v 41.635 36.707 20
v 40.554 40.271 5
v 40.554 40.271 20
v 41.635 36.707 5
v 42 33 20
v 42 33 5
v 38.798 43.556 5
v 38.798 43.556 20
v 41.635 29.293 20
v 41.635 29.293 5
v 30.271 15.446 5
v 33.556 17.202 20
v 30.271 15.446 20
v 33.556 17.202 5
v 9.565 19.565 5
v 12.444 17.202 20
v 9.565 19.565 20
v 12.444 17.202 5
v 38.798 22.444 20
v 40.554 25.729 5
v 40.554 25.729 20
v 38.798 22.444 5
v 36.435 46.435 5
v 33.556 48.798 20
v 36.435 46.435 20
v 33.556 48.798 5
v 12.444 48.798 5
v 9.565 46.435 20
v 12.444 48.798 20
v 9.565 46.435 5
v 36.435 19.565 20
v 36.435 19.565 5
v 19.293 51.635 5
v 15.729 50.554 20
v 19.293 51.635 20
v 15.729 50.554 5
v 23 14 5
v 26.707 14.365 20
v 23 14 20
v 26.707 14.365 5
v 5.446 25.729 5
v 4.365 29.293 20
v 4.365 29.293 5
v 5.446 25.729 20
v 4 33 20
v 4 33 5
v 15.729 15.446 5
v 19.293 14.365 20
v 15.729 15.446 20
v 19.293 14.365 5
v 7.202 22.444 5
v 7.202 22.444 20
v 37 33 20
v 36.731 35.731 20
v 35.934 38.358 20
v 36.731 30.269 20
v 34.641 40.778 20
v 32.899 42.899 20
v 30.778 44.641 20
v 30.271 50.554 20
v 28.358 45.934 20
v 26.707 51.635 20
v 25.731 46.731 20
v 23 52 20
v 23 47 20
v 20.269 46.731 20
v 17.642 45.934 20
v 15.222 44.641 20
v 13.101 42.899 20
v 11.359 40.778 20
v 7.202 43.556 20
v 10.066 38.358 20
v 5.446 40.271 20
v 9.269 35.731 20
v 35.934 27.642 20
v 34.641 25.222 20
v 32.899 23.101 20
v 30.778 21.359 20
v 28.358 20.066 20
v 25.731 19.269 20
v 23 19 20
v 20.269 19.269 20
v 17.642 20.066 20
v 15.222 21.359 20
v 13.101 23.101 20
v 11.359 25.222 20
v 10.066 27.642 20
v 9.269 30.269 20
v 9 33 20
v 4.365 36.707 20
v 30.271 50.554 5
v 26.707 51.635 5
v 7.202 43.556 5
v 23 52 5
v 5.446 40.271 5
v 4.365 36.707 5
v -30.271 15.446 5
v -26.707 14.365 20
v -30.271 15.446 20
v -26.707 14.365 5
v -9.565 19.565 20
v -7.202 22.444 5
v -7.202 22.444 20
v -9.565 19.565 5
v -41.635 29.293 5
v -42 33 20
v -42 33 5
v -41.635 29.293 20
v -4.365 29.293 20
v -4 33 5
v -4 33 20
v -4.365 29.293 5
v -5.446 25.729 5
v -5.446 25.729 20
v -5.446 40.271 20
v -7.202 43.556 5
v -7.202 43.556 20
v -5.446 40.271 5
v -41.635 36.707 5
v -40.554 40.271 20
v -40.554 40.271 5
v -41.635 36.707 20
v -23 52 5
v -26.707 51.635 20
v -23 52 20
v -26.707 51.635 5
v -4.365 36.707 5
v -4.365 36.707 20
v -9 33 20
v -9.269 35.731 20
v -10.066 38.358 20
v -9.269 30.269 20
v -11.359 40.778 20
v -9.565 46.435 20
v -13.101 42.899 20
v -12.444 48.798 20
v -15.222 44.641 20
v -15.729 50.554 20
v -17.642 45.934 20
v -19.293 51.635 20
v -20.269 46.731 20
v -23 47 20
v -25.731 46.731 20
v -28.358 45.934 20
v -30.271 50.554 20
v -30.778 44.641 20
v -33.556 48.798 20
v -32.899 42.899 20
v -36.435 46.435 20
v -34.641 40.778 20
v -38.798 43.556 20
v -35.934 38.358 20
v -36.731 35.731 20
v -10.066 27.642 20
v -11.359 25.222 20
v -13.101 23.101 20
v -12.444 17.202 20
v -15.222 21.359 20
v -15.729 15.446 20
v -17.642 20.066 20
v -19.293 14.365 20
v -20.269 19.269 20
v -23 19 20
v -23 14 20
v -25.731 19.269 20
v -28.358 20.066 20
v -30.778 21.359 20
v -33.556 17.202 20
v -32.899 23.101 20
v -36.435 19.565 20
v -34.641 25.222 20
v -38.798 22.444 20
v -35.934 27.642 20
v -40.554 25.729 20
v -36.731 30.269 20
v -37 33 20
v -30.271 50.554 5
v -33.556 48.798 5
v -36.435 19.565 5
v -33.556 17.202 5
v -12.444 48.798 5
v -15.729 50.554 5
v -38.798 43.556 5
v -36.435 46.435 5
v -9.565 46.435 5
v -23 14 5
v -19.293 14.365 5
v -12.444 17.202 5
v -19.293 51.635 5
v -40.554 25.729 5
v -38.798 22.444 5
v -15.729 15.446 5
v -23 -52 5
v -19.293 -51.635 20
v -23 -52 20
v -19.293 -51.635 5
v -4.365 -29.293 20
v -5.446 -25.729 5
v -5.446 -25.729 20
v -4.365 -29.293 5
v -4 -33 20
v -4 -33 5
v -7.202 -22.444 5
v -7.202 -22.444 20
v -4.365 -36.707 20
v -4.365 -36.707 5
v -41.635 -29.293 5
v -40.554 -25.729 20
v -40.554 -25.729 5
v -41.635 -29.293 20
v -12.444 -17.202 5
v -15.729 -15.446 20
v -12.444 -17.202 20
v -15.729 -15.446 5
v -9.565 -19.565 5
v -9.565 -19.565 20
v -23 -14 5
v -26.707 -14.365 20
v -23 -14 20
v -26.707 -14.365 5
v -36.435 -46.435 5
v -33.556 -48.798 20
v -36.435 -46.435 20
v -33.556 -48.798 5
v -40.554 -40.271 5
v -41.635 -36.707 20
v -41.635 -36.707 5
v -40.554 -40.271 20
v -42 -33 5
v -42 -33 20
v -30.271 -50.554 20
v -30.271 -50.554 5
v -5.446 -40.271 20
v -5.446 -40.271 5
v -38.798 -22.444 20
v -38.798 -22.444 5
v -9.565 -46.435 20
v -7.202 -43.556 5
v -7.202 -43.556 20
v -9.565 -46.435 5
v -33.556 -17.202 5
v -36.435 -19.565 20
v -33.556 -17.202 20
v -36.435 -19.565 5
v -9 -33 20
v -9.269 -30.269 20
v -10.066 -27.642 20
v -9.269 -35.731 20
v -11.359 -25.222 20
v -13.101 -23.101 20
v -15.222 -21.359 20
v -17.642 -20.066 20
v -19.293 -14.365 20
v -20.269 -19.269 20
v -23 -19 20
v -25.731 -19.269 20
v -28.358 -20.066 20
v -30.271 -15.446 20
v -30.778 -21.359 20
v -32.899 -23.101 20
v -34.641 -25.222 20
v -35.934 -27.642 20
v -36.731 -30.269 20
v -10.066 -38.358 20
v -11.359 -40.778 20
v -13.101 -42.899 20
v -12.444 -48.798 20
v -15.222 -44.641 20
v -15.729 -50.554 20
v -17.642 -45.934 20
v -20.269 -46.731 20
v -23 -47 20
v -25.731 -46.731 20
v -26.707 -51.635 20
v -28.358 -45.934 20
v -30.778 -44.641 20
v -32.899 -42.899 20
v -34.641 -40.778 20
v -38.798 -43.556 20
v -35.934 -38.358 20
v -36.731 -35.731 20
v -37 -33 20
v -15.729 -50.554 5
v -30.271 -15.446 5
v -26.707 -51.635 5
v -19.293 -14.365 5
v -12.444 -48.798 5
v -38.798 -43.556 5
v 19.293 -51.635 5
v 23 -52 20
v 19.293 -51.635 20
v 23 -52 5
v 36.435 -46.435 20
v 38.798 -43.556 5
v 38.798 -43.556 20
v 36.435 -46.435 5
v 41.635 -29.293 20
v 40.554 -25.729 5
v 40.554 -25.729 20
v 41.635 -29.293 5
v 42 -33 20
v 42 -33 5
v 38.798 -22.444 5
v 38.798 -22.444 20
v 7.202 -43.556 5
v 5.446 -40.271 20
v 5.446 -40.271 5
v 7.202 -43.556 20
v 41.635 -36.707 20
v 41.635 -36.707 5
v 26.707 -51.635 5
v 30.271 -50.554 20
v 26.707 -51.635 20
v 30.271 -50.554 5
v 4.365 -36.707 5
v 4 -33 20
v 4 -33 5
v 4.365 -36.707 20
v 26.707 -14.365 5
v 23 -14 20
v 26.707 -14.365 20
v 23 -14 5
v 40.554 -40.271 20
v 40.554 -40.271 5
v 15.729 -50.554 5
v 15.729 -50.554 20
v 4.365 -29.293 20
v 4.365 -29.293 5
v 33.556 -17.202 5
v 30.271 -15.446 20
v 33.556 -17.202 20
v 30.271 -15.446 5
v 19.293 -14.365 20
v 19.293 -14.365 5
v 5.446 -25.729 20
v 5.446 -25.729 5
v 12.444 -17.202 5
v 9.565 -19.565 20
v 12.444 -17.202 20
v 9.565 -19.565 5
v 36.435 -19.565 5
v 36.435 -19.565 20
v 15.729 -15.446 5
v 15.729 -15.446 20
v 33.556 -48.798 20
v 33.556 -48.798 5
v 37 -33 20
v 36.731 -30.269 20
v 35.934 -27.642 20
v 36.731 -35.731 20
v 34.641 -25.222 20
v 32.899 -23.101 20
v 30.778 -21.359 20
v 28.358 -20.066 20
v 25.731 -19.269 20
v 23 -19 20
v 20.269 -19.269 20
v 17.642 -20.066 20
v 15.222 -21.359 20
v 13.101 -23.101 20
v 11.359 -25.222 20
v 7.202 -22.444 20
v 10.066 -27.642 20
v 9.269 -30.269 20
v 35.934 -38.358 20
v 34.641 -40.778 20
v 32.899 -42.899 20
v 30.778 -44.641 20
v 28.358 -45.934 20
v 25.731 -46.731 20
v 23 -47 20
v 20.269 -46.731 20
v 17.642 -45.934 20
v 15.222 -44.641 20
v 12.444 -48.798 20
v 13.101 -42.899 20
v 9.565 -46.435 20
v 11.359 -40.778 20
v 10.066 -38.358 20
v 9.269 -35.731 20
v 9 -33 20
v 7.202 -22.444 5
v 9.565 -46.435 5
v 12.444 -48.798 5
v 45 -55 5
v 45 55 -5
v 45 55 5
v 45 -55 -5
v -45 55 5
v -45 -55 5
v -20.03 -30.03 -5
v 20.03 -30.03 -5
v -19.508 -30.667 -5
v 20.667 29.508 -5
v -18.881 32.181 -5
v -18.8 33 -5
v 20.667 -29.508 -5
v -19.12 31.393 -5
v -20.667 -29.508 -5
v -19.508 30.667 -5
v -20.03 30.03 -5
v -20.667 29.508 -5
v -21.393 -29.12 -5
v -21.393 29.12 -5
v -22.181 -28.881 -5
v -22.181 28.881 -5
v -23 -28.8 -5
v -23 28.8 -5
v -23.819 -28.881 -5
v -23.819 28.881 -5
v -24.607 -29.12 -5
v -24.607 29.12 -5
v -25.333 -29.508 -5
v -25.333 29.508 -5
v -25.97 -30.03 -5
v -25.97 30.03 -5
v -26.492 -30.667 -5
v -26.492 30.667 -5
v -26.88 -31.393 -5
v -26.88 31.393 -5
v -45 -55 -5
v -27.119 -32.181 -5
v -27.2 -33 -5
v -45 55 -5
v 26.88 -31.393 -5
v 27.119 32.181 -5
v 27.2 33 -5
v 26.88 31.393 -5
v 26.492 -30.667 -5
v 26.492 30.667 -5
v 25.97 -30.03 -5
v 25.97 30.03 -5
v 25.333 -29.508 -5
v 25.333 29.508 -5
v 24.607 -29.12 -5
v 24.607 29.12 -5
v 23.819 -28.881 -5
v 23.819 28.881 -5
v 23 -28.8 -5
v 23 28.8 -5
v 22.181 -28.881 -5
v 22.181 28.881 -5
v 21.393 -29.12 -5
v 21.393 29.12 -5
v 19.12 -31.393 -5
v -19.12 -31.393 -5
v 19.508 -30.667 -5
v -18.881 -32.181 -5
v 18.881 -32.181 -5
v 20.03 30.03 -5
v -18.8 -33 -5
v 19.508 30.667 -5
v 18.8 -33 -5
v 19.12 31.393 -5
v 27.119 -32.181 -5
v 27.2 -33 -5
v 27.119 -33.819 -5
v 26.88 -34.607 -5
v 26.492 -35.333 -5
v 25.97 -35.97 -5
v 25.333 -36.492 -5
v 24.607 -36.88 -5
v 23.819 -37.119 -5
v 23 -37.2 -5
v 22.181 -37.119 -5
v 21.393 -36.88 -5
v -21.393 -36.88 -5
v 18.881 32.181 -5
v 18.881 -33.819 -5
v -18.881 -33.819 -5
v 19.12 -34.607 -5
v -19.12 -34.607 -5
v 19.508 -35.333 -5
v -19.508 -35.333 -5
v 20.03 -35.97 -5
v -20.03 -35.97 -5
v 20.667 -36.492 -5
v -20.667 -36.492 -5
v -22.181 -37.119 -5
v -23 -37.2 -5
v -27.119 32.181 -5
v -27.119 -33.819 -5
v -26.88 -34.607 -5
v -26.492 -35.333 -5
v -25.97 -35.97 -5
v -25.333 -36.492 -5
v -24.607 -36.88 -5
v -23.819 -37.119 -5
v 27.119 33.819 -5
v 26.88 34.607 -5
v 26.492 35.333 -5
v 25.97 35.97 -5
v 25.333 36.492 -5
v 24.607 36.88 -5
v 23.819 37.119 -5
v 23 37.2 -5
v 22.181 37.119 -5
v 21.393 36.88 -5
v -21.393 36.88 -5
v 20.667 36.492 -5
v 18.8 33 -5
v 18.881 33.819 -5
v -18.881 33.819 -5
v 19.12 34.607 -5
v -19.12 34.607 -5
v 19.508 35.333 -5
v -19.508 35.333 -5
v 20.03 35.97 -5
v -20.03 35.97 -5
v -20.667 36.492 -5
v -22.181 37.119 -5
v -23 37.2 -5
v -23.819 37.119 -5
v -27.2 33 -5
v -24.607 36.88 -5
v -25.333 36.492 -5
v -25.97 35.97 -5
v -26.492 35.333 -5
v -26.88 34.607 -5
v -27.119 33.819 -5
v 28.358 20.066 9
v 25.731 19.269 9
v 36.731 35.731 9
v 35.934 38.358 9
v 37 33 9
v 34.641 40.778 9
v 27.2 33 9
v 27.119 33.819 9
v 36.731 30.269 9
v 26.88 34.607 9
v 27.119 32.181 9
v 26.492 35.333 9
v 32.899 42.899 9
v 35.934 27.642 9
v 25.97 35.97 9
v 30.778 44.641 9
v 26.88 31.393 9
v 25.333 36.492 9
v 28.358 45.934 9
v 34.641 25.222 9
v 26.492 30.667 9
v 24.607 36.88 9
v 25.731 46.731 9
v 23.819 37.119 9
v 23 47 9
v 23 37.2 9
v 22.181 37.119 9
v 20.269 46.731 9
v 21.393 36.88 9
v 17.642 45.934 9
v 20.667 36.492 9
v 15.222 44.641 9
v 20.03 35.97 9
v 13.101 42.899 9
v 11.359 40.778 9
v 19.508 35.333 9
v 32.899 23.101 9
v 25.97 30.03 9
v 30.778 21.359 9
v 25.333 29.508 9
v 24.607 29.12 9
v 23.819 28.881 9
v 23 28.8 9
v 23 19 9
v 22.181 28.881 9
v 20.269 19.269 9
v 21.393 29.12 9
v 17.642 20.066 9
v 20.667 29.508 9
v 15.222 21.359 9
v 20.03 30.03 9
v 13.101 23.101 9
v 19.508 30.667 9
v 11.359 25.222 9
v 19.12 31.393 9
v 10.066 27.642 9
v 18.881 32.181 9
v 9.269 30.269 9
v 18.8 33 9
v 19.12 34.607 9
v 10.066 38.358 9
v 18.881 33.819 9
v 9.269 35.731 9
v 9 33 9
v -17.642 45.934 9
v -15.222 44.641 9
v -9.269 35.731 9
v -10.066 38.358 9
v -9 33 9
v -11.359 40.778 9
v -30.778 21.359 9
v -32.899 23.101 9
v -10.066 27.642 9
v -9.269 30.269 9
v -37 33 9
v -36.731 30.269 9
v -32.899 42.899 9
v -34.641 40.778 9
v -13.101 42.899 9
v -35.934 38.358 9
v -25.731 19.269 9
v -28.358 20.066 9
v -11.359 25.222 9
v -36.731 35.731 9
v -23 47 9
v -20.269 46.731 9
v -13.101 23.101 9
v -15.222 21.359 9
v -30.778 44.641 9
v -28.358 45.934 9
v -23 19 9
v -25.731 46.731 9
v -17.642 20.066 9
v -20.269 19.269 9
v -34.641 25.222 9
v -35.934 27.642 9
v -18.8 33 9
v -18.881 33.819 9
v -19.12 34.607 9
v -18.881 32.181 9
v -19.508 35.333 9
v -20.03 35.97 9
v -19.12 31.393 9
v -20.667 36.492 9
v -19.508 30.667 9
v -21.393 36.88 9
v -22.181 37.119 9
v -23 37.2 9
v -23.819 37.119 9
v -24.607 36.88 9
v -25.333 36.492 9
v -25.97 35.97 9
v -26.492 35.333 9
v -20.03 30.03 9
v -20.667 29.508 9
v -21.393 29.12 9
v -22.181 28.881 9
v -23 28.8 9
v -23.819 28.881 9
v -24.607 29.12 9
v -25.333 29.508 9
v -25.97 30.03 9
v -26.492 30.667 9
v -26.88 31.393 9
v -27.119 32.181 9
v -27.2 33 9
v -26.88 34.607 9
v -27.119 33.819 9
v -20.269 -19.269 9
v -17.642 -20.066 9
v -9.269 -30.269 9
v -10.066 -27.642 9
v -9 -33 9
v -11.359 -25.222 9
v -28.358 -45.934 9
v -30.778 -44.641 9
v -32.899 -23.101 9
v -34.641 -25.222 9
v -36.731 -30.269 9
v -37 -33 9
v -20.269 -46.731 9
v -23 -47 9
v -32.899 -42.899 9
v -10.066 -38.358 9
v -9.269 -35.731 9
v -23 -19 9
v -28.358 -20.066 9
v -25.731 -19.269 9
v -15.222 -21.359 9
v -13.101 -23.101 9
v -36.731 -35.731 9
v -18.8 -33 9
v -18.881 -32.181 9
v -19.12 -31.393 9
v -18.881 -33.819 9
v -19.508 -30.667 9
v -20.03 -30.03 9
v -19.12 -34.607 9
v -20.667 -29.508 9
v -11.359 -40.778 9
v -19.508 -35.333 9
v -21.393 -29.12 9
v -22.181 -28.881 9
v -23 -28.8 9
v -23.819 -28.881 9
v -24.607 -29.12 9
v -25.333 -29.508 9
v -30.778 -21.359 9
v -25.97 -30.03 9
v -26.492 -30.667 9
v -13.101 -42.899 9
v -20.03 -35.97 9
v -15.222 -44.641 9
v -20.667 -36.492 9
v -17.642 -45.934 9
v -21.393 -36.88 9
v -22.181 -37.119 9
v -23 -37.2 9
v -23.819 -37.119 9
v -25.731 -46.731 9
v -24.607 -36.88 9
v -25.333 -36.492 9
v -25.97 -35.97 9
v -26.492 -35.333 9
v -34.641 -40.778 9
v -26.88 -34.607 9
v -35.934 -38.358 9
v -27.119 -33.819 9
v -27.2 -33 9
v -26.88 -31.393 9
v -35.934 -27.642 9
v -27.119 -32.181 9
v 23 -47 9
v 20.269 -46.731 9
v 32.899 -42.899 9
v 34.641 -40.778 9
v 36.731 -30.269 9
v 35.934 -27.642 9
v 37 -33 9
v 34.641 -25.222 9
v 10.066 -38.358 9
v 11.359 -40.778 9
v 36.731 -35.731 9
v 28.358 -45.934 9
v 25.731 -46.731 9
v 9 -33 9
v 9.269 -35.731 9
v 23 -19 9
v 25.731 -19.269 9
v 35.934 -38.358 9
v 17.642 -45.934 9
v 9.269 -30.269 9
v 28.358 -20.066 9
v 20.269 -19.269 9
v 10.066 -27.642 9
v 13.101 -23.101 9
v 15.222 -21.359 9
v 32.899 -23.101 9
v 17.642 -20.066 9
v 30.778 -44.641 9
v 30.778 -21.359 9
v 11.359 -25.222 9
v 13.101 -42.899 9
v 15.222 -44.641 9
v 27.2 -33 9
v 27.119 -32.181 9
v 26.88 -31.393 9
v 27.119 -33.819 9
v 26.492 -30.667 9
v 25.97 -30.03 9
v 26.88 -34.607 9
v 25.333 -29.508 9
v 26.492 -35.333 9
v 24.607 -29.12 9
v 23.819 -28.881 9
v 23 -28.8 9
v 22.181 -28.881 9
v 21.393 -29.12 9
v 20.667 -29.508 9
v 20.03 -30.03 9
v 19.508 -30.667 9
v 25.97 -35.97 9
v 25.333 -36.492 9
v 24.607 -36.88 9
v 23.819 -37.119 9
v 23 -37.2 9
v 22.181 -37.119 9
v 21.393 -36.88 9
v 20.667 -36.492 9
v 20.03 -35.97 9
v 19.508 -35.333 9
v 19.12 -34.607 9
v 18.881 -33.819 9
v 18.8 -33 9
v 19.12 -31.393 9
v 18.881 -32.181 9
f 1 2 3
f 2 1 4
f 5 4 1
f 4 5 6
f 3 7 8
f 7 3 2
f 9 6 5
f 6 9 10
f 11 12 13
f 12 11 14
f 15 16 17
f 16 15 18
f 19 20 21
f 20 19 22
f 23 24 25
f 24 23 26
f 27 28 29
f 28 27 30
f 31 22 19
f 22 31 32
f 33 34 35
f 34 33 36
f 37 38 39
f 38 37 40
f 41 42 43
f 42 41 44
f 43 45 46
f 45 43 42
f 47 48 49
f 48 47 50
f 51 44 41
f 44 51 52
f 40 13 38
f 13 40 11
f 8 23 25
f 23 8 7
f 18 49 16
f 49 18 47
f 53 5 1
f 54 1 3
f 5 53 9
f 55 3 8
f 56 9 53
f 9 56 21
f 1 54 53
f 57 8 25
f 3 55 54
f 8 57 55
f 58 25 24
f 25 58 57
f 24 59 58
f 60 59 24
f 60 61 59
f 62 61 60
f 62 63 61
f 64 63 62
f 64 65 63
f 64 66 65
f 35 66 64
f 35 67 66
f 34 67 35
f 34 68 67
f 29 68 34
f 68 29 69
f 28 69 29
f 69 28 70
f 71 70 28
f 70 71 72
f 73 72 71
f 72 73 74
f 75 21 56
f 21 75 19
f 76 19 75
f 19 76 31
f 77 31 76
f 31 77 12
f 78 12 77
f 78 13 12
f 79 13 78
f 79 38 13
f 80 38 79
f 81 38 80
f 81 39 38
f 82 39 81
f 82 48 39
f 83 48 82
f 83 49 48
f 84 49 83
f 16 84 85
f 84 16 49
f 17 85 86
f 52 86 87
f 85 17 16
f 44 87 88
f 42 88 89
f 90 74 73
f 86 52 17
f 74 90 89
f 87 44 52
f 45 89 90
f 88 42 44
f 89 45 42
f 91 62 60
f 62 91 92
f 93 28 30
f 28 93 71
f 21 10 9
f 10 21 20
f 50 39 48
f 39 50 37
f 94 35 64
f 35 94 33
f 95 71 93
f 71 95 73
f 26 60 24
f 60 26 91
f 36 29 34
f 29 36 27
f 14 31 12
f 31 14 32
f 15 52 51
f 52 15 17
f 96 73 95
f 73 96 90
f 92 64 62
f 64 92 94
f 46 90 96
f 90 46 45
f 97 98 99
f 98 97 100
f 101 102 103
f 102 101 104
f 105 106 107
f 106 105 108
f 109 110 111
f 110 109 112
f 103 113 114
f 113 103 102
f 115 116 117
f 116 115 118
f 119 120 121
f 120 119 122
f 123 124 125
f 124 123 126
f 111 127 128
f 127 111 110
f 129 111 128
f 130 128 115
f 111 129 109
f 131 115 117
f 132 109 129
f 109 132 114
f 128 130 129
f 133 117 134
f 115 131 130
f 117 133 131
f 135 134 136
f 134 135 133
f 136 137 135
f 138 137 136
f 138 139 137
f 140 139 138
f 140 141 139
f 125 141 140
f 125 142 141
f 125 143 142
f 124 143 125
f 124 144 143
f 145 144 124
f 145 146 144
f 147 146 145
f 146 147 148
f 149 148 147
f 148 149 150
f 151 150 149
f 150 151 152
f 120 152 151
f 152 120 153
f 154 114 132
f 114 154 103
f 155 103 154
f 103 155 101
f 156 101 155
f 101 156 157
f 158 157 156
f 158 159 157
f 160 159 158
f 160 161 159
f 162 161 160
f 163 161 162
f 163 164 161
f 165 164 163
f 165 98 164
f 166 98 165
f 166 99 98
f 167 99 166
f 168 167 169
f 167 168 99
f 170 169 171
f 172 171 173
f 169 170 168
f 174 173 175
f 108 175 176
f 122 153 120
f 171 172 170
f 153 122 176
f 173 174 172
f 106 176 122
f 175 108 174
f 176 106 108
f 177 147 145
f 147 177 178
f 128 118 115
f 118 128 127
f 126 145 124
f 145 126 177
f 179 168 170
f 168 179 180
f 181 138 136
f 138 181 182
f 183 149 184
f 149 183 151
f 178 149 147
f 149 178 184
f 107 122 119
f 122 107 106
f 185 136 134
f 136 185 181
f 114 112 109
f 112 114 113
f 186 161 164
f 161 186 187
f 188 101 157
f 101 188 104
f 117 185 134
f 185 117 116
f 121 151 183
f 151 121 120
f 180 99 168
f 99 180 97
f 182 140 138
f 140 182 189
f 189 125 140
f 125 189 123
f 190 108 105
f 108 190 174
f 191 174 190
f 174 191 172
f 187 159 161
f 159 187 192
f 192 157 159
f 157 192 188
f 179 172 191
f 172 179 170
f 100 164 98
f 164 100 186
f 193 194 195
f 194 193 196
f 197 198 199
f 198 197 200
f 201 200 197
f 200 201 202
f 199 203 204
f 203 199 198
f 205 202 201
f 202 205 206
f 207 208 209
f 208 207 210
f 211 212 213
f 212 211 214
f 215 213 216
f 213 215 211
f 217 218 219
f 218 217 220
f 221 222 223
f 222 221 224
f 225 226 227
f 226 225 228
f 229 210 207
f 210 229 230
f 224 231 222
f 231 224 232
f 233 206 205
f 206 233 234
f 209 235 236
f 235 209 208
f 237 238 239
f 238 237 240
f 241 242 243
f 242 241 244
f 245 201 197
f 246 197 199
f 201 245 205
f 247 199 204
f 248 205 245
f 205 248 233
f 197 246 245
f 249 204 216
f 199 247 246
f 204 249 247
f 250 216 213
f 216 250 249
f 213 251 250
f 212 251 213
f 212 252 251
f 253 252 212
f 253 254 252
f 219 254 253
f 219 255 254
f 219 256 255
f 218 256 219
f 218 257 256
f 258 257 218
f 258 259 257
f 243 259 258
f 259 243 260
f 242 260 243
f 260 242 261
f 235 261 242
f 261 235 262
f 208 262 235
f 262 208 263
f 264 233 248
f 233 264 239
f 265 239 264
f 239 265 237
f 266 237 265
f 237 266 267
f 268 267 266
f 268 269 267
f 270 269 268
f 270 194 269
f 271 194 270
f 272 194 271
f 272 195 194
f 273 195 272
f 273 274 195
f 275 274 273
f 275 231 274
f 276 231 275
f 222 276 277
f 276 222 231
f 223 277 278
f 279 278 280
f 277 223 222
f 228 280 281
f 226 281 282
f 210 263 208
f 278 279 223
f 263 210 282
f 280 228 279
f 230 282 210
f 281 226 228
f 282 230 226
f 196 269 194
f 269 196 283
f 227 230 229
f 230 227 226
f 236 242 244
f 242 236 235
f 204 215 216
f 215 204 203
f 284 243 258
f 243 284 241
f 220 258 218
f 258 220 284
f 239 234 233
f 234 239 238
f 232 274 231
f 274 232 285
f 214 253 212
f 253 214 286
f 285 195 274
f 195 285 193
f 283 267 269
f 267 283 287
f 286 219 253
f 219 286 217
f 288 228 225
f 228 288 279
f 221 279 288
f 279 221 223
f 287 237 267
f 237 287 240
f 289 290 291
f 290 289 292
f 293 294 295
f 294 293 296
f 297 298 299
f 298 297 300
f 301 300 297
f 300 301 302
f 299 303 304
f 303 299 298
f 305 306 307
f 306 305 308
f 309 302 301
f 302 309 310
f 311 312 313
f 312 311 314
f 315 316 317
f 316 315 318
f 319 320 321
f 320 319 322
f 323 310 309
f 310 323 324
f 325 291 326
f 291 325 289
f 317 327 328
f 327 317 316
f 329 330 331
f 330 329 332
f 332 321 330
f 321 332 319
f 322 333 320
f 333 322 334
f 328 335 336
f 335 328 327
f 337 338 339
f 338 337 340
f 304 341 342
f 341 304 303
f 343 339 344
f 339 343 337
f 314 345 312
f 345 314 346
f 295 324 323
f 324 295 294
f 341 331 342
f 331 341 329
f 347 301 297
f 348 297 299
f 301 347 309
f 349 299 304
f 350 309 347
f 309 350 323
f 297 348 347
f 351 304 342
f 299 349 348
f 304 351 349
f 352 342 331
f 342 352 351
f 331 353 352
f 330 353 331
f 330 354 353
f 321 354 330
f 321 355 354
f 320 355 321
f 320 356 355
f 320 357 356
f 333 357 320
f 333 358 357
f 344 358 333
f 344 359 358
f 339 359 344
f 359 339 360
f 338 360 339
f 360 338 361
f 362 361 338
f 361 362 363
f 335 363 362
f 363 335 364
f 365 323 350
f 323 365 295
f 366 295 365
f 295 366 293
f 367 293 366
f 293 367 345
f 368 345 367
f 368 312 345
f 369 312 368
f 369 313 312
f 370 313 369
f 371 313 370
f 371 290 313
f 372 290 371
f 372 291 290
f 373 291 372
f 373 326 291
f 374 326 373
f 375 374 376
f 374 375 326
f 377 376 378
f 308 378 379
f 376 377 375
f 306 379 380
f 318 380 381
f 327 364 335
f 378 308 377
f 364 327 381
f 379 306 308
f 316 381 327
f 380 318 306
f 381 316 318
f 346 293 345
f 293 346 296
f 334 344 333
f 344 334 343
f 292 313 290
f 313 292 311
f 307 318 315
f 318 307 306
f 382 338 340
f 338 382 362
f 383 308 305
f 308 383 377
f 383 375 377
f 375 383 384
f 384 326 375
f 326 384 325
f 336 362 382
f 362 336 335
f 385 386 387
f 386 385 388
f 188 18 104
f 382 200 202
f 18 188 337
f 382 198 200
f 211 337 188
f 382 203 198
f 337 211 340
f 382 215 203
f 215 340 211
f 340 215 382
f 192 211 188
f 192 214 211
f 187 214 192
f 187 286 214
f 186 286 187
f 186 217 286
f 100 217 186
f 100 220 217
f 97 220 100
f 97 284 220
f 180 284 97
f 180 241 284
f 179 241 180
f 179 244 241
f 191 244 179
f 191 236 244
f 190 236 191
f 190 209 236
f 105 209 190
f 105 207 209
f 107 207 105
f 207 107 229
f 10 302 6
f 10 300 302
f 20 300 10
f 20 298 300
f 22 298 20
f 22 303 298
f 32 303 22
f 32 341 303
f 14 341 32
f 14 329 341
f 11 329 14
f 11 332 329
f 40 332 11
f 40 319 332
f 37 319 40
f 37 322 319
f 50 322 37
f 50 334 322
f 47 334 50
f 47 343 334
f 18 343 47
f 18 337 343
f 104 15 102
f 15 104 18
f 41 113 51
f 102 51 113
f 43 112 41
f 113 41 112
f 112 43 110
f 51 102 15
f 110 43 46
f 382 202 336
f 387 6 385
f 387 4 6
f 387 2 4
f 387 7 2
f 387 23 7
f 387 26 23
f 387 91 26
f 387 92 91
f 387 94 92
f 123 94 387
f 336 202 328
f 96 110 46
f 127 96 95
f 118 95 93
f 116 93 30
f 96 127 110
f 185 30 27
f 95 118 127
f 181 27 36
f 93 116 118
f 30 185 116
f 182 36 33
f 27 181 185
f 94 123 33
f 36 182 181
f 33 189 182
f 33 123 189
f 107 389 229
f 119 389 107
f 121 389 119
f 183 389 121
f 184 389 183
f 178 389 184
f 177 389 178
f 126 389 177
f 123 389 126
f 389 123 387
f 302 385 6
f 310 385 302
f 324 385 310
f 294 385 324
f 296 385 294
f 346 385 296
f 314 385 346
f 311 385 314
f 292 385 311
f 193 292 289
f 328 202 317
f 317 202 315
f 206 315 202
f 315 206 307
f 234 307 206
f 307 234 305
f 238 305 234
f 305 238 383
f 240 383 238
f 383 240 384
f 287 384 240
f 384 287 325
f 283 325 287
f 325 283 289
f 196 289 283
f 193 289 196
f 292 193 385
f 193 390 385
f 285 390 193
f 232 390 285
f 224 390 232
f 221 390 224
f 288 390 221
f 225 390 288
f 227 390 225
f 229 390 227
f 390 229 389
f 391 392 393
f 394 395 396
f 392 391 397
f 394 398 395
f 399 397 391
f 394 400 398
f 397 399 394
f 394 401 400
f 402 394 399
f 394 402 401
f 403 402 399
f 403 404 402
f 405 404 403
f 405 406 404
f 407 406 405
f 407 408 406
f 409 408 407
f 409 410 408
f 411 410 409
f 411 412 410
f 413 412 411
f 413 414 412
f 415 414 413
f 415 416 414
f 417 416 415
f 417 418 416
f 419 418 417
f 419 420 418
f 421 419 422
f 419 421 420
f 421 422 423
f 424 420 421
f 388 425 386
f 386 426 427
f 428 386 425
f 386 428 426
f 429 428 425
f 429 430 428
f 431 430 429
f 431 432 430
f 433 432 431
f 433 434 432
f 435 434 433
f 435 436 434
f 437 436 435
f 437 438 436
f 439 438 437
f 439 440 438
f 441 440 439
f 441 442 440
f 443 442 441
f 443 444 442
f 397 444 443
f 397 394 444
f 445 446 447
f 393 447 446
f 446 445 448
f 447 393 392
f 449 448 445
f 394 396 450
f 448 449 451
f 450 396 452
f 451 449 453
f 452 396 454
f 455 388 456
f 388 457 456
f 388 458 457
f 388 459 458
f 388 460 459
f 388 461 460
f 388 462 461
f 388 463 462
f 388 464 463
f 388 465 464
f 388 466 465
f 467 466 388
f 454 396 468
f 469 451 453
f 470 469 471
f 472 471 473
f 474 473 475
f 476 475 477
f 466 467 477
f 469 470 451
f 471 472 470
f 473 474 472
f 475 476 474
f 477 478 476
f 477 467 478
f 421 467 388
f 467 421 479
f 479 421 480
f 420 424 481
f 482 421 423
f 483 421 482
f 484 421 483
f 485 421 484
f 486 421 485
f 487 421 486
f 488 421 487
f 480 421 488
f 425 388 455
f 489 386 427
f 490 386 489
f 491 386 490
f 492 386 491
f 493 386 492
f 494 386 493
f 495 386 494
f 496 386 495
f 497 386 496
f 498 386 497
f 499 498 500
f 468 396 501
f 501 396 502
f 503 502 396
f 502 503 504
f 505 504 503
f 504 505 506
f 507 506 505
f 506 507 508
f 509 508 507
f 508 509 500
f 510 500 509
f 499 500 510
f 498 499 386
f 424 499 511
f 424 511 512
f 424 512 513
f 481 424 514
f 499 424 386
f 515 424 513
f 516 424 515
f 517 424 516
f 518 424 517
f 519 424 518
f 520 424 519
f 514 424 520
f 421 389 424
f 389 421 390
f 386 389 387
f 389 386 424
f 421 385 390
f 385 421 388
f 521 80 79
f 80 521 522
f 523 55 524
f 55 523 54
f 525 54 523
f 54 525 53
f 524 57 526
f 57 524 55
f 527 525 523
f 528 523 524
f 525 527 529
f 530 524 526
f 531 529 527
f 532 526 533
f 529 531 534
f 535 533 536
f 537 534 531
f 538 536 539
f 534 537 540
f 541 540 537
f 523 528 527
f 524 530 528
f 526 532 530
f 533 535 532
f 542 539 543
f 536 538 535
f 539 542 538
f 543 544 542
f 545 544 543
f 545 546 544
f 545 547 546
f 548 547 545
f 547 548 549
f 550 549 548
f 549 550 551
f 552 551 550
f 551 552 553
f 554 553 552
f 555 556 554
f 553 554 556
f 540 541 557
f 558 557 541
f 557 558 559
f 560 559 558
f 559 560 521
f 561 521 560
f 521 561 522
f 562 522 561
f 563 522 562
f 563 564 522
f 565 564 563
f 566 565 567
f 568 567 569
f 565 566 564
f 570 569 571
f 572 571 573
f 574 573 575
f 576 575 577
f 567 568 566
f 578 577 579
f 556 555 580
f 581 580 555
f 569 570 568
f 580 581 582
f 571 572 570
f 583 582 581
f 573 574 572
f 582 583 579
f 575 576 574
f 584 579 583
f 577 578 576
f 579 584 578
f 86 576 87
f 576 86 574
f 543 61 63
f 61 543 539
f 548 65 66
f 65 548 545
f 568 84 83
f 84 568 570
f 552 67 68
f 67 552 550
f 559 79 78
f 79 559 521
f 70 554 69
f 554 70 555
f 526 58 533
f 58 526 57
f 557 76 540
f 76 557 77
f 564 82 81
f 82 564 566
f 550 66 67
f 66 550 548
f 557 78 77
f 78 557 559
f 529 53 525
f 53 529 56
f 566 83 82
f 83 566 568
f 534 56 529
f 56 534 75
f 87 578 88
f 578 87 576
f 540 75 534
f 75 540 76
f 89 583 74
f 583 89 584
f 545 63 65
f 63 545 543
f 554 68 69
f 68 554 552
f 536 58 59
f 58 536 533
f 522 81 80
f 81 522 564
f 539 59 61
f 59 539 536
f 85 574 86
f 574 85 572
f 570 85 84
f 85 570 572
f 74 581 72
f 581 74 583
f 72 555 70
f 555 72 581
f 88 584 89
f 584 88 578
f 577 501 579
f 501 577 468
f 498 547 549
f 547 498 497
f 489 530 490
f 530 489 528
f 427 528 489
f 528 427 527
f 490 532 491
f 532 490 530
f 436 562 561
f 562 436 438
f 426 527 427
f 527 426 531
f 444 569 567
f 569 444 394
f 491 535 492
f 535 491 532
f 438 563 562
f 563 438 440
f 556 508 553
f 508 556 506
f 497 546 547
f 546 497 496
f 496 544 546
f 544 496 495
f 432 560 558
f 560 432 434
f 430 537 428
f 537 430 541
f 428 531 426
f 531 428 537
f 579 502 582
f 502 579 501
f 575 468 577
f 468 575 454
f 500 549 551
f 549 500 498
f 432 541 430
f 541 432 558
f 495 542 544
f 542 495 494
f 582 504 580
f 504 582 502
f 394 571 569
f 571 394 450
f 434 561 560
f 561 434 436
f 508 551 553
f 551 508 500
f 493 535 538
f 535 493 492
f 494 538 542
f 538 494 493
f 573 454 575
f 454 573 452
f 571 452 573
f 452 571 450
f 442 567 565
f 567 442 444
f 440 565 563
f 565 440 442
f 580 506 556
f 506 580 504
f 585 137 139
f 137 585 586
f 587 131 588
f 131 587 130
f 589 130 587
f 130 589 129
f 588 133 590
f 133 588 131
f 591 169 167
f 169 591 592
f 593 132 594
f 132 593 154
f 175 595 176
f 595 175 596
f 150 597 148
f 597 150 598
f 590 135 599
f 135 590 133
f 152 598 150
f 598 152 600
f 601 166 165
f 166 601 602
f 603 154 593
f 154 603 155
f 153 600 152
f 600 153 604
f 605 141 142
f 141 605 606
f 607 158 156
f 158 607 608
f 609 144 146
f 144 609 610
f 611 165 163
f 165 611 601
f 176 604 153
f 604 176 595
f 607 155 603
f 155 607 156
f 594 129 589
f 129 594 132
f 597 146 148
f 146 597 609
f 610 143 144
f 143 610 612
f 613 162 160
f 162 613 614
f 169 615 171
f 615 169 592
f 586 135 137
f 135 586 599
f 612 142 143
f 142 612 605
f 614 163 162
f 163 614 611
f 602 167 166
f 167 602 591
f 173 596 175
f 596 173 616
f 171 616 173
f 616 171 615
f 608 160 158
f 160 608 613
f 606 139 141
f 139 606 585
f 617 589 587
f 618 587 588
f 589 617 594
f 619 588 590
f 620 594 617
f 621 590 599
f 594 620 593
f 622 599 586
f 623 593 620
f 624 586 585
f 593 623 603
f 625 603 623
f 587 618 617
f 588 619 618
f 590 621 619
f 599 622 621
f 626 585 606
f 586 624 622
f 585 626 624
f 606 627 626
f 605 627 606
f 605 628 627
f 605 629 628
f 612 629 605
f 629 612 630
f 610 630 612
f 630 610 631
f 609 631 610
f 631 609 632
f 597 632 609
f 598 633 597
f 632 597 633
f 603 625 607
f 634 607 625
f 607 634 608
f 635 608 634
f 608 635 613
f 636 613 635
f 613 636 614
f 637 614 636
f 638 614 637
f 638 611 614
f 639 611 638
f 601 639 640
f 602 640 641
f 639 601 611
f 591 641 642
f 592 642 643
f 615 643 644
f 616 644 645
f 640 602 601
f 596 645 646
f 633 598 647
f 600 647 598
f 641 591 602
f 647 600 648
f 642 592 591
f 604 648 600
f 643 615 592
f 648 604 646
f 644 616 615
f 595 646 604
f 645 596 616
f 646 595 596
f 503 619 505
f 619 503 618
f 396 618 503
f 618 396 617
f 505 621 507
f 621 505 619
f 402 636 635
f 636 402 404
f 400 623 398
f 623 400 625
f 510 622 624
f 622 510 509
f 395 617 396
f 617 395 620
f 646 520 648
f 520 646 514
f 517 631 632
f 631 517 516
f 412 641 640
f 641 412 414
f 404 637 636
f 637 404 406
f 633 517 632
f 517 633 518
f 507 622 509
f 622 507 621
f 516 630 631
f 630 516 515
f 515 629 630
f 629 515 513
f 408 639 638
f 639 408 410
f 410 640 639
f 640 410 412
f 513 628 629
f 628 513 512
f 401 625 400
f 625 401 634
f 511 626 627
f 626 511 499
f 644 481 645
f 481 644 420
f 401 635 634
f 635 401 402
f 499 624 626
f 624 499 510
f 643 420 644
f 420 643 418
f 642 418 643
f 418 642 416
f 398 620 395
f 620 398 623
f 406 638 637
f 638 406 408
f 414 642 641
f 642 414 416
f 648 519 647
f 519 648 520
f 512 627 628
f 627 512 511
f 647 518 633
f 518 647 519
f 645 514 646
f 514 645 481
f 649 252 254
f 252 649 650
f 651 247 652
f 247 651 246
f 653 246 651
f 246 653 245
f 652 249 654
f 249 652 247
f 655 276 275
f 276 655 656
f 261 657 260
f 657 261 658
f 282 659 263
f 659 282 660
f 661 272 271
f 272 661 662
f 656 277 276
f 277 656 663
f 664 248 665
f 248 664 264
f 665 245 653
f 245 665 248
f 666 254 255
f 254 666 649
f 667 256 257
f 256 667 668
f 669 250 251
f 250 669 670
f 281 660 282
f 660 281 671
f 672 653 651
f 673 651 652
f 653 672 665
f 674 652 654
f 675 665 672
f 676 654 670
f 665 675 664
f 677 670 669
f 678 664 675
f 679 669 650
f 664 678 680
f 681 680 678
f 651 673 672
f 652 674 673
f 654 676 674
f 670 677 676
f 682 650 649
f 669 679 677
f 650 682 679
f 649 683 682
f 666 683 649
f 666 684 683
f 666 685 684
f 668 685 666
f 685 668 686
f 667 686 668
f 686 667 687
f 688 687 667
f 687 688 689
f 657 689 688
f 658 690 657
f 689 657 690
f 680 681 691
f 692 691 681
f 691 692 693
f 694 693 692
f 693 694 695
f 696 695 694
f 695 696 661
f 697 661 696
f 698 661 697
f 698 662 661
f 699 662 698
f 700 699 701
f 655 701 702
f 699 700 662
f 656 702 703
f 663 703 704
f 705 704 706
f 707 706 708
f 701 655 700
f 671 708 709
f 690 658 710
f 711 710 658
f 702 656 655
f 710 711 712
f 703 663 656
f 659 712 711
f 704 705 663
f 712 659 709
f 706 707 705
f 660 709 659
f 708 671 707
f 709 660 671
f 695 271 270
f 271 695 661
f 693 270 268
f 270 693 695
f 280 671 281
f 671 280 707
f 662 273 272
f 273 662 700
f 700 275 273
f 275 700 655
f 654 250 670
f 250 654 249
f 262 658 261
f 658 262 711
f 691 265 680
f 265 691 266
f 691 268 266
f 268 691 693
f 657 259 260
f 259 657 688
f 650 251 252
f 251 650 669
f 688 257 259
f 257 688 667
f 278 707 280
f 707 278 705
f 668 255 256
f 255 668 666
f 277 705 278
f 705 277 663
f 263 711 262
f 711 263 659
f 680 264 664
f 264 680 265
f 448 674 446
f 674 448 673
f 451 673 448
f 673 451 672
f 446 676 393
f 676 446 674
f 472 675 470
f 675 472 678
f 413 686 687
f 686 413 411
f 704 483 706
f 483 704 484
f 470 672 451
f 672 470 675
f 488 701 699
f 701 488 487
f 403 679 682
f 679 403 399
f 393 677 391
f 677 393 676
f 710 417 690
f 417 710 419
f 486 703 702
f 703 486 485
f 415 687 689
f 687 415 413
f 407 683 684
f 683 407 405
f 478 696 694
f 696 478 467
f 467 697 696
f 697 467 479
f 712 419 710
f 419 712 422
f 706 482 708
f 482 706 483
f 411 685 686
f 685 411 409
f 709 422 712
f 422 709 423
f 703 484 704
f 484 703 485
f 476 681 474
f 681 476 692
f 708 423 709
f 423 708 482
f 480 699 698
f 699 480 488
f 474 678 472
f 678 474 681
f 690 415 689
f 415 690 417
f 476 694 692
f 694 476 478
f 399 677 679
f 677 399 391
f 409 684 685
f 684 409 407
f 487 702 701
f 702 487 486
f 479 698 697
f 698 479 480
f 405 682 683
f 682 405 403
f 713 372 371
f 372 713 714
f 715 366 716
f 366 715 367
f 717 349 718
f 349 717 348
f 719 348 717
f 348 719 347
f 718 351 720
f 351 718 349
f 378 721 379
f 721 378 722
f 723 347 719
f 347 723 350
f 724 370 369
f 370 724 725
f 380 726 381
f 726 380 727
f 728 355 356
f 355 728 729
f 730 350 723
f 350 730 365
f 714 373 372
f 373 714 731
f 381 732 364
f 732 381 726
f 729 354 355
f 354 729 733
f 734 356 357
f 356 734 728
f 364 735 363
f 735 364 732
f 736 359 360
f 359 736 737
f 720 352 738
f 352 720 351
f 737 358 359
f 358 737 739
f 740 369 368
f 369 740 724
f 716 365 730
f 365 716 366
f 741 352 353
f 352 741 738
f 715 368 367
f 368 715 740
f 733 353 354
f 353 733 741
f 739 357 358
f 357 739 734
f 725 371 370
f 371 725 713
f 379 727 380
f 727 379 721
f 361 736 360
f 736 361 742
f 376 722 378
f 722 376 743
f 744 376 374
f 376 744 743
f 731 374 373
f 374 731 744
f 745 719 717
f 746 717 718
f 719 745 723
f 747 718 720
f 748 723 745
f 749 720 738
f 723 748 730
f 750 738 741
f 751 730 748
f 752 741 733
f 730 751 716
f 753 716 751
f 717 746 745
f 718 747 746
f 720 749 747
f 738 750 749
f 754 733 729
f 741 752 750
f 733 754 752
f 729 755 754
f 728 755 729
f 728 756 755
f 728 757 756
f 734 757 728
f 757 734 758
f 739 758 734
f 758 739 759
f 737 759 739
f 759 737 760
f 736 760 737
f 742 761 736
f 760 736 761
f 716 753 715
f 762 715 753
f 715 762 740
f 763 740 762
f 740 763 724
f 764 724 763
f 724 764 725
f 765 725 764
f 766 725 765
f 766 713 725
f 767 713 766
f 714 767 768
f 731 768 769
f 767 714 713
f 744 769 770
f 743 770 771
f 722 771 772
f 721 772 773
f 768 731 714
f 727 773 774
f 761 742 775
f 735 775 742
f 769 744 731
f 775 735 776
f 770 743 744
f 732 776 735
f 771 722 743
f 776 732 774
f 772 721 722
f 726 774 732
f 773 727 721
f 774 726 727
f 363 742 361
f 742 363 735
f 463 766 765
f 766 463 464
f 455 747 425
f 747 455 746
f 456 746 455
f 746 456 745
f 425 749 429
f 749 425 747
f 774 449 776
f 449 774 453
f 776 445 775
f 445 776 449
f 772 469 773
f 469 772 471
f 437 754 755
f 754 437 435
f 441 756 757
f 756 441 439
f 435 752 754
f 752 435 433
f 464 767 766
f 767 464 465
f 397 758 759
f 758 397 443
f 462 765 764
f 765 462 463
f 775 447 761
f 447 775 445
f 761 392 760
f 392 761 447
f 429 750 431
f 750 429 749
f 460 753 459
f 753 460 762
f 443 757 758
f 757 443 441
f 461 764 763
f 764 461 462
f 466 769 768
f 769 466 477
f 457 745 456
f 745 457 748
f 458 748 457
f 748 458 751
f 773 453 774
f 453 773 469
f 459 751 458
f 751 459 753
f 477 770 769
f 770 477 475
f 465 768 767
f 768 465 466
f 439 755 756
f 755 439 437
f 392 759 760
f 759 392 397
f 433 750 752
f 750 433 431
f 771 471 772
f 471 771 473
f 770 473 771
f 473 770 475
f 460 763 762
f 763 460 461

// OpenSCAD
$fn = 32;

// ----------------------------------------------------------------------
// Socket pad plate
// bosses with counterbored sockets for the screws
// ----------------------------------------------------------------------

// --- parameters (mm) ---
base_t = 10;            // base plate thickness
boss_h = 15;            // boss height above the base plate
boss_d = 38;            // boss diameter
socket_d = 28;          // socket diameter
socket_depth = 11;      // socket depth from the boss face
bolt_d = 8.4;           // screw clearance hole through the socket floor
plate = [90, 110, 10];  // overall size (x, y, z)
edge = 22;              // boss centre offset from the plate edge
pads = 4;               // boss count, one per corner

// --- derived feature positions (mm) ---
height = base_t + boss_h;        // = 25   overall height of the part
corner_x = plate[0] / 2 - edge;  // = 23   boss centre X
corner_y = plate[1] / 2 - edge;  // = 33   boss centre Y
feature_centers = [
  [corner_x, corner_y],
  [-corner_x, corner_y],
  [-corner_x, -corner_y],
  [corner_x, -corner_y]
];   // boss centres: sockets, holes and the pads themselves are placed from here

// base plate, bosses on feature_centers, socket + through hole in each
difference() {
  union() {
    cube(plate, center = true);
    for (centre = feature_centers)
      translate([centre[0], centre[1], plate[2] / 2 - 1])
        cylinder(d = boss_d, h = boss_h + 1);
  }
  for (centre = feature_centers) {
    translate([centre[0], centre[1], plate[2] / 2 + boss_h - socket_depth])
      cylinder(d = socket_d, h = socket_depth + 1);
    translate([centre[0], centre[1], -height])
      cylinder(d = bolt_d, h = 2 * height + 2);  // through the socket floor
  }
}
